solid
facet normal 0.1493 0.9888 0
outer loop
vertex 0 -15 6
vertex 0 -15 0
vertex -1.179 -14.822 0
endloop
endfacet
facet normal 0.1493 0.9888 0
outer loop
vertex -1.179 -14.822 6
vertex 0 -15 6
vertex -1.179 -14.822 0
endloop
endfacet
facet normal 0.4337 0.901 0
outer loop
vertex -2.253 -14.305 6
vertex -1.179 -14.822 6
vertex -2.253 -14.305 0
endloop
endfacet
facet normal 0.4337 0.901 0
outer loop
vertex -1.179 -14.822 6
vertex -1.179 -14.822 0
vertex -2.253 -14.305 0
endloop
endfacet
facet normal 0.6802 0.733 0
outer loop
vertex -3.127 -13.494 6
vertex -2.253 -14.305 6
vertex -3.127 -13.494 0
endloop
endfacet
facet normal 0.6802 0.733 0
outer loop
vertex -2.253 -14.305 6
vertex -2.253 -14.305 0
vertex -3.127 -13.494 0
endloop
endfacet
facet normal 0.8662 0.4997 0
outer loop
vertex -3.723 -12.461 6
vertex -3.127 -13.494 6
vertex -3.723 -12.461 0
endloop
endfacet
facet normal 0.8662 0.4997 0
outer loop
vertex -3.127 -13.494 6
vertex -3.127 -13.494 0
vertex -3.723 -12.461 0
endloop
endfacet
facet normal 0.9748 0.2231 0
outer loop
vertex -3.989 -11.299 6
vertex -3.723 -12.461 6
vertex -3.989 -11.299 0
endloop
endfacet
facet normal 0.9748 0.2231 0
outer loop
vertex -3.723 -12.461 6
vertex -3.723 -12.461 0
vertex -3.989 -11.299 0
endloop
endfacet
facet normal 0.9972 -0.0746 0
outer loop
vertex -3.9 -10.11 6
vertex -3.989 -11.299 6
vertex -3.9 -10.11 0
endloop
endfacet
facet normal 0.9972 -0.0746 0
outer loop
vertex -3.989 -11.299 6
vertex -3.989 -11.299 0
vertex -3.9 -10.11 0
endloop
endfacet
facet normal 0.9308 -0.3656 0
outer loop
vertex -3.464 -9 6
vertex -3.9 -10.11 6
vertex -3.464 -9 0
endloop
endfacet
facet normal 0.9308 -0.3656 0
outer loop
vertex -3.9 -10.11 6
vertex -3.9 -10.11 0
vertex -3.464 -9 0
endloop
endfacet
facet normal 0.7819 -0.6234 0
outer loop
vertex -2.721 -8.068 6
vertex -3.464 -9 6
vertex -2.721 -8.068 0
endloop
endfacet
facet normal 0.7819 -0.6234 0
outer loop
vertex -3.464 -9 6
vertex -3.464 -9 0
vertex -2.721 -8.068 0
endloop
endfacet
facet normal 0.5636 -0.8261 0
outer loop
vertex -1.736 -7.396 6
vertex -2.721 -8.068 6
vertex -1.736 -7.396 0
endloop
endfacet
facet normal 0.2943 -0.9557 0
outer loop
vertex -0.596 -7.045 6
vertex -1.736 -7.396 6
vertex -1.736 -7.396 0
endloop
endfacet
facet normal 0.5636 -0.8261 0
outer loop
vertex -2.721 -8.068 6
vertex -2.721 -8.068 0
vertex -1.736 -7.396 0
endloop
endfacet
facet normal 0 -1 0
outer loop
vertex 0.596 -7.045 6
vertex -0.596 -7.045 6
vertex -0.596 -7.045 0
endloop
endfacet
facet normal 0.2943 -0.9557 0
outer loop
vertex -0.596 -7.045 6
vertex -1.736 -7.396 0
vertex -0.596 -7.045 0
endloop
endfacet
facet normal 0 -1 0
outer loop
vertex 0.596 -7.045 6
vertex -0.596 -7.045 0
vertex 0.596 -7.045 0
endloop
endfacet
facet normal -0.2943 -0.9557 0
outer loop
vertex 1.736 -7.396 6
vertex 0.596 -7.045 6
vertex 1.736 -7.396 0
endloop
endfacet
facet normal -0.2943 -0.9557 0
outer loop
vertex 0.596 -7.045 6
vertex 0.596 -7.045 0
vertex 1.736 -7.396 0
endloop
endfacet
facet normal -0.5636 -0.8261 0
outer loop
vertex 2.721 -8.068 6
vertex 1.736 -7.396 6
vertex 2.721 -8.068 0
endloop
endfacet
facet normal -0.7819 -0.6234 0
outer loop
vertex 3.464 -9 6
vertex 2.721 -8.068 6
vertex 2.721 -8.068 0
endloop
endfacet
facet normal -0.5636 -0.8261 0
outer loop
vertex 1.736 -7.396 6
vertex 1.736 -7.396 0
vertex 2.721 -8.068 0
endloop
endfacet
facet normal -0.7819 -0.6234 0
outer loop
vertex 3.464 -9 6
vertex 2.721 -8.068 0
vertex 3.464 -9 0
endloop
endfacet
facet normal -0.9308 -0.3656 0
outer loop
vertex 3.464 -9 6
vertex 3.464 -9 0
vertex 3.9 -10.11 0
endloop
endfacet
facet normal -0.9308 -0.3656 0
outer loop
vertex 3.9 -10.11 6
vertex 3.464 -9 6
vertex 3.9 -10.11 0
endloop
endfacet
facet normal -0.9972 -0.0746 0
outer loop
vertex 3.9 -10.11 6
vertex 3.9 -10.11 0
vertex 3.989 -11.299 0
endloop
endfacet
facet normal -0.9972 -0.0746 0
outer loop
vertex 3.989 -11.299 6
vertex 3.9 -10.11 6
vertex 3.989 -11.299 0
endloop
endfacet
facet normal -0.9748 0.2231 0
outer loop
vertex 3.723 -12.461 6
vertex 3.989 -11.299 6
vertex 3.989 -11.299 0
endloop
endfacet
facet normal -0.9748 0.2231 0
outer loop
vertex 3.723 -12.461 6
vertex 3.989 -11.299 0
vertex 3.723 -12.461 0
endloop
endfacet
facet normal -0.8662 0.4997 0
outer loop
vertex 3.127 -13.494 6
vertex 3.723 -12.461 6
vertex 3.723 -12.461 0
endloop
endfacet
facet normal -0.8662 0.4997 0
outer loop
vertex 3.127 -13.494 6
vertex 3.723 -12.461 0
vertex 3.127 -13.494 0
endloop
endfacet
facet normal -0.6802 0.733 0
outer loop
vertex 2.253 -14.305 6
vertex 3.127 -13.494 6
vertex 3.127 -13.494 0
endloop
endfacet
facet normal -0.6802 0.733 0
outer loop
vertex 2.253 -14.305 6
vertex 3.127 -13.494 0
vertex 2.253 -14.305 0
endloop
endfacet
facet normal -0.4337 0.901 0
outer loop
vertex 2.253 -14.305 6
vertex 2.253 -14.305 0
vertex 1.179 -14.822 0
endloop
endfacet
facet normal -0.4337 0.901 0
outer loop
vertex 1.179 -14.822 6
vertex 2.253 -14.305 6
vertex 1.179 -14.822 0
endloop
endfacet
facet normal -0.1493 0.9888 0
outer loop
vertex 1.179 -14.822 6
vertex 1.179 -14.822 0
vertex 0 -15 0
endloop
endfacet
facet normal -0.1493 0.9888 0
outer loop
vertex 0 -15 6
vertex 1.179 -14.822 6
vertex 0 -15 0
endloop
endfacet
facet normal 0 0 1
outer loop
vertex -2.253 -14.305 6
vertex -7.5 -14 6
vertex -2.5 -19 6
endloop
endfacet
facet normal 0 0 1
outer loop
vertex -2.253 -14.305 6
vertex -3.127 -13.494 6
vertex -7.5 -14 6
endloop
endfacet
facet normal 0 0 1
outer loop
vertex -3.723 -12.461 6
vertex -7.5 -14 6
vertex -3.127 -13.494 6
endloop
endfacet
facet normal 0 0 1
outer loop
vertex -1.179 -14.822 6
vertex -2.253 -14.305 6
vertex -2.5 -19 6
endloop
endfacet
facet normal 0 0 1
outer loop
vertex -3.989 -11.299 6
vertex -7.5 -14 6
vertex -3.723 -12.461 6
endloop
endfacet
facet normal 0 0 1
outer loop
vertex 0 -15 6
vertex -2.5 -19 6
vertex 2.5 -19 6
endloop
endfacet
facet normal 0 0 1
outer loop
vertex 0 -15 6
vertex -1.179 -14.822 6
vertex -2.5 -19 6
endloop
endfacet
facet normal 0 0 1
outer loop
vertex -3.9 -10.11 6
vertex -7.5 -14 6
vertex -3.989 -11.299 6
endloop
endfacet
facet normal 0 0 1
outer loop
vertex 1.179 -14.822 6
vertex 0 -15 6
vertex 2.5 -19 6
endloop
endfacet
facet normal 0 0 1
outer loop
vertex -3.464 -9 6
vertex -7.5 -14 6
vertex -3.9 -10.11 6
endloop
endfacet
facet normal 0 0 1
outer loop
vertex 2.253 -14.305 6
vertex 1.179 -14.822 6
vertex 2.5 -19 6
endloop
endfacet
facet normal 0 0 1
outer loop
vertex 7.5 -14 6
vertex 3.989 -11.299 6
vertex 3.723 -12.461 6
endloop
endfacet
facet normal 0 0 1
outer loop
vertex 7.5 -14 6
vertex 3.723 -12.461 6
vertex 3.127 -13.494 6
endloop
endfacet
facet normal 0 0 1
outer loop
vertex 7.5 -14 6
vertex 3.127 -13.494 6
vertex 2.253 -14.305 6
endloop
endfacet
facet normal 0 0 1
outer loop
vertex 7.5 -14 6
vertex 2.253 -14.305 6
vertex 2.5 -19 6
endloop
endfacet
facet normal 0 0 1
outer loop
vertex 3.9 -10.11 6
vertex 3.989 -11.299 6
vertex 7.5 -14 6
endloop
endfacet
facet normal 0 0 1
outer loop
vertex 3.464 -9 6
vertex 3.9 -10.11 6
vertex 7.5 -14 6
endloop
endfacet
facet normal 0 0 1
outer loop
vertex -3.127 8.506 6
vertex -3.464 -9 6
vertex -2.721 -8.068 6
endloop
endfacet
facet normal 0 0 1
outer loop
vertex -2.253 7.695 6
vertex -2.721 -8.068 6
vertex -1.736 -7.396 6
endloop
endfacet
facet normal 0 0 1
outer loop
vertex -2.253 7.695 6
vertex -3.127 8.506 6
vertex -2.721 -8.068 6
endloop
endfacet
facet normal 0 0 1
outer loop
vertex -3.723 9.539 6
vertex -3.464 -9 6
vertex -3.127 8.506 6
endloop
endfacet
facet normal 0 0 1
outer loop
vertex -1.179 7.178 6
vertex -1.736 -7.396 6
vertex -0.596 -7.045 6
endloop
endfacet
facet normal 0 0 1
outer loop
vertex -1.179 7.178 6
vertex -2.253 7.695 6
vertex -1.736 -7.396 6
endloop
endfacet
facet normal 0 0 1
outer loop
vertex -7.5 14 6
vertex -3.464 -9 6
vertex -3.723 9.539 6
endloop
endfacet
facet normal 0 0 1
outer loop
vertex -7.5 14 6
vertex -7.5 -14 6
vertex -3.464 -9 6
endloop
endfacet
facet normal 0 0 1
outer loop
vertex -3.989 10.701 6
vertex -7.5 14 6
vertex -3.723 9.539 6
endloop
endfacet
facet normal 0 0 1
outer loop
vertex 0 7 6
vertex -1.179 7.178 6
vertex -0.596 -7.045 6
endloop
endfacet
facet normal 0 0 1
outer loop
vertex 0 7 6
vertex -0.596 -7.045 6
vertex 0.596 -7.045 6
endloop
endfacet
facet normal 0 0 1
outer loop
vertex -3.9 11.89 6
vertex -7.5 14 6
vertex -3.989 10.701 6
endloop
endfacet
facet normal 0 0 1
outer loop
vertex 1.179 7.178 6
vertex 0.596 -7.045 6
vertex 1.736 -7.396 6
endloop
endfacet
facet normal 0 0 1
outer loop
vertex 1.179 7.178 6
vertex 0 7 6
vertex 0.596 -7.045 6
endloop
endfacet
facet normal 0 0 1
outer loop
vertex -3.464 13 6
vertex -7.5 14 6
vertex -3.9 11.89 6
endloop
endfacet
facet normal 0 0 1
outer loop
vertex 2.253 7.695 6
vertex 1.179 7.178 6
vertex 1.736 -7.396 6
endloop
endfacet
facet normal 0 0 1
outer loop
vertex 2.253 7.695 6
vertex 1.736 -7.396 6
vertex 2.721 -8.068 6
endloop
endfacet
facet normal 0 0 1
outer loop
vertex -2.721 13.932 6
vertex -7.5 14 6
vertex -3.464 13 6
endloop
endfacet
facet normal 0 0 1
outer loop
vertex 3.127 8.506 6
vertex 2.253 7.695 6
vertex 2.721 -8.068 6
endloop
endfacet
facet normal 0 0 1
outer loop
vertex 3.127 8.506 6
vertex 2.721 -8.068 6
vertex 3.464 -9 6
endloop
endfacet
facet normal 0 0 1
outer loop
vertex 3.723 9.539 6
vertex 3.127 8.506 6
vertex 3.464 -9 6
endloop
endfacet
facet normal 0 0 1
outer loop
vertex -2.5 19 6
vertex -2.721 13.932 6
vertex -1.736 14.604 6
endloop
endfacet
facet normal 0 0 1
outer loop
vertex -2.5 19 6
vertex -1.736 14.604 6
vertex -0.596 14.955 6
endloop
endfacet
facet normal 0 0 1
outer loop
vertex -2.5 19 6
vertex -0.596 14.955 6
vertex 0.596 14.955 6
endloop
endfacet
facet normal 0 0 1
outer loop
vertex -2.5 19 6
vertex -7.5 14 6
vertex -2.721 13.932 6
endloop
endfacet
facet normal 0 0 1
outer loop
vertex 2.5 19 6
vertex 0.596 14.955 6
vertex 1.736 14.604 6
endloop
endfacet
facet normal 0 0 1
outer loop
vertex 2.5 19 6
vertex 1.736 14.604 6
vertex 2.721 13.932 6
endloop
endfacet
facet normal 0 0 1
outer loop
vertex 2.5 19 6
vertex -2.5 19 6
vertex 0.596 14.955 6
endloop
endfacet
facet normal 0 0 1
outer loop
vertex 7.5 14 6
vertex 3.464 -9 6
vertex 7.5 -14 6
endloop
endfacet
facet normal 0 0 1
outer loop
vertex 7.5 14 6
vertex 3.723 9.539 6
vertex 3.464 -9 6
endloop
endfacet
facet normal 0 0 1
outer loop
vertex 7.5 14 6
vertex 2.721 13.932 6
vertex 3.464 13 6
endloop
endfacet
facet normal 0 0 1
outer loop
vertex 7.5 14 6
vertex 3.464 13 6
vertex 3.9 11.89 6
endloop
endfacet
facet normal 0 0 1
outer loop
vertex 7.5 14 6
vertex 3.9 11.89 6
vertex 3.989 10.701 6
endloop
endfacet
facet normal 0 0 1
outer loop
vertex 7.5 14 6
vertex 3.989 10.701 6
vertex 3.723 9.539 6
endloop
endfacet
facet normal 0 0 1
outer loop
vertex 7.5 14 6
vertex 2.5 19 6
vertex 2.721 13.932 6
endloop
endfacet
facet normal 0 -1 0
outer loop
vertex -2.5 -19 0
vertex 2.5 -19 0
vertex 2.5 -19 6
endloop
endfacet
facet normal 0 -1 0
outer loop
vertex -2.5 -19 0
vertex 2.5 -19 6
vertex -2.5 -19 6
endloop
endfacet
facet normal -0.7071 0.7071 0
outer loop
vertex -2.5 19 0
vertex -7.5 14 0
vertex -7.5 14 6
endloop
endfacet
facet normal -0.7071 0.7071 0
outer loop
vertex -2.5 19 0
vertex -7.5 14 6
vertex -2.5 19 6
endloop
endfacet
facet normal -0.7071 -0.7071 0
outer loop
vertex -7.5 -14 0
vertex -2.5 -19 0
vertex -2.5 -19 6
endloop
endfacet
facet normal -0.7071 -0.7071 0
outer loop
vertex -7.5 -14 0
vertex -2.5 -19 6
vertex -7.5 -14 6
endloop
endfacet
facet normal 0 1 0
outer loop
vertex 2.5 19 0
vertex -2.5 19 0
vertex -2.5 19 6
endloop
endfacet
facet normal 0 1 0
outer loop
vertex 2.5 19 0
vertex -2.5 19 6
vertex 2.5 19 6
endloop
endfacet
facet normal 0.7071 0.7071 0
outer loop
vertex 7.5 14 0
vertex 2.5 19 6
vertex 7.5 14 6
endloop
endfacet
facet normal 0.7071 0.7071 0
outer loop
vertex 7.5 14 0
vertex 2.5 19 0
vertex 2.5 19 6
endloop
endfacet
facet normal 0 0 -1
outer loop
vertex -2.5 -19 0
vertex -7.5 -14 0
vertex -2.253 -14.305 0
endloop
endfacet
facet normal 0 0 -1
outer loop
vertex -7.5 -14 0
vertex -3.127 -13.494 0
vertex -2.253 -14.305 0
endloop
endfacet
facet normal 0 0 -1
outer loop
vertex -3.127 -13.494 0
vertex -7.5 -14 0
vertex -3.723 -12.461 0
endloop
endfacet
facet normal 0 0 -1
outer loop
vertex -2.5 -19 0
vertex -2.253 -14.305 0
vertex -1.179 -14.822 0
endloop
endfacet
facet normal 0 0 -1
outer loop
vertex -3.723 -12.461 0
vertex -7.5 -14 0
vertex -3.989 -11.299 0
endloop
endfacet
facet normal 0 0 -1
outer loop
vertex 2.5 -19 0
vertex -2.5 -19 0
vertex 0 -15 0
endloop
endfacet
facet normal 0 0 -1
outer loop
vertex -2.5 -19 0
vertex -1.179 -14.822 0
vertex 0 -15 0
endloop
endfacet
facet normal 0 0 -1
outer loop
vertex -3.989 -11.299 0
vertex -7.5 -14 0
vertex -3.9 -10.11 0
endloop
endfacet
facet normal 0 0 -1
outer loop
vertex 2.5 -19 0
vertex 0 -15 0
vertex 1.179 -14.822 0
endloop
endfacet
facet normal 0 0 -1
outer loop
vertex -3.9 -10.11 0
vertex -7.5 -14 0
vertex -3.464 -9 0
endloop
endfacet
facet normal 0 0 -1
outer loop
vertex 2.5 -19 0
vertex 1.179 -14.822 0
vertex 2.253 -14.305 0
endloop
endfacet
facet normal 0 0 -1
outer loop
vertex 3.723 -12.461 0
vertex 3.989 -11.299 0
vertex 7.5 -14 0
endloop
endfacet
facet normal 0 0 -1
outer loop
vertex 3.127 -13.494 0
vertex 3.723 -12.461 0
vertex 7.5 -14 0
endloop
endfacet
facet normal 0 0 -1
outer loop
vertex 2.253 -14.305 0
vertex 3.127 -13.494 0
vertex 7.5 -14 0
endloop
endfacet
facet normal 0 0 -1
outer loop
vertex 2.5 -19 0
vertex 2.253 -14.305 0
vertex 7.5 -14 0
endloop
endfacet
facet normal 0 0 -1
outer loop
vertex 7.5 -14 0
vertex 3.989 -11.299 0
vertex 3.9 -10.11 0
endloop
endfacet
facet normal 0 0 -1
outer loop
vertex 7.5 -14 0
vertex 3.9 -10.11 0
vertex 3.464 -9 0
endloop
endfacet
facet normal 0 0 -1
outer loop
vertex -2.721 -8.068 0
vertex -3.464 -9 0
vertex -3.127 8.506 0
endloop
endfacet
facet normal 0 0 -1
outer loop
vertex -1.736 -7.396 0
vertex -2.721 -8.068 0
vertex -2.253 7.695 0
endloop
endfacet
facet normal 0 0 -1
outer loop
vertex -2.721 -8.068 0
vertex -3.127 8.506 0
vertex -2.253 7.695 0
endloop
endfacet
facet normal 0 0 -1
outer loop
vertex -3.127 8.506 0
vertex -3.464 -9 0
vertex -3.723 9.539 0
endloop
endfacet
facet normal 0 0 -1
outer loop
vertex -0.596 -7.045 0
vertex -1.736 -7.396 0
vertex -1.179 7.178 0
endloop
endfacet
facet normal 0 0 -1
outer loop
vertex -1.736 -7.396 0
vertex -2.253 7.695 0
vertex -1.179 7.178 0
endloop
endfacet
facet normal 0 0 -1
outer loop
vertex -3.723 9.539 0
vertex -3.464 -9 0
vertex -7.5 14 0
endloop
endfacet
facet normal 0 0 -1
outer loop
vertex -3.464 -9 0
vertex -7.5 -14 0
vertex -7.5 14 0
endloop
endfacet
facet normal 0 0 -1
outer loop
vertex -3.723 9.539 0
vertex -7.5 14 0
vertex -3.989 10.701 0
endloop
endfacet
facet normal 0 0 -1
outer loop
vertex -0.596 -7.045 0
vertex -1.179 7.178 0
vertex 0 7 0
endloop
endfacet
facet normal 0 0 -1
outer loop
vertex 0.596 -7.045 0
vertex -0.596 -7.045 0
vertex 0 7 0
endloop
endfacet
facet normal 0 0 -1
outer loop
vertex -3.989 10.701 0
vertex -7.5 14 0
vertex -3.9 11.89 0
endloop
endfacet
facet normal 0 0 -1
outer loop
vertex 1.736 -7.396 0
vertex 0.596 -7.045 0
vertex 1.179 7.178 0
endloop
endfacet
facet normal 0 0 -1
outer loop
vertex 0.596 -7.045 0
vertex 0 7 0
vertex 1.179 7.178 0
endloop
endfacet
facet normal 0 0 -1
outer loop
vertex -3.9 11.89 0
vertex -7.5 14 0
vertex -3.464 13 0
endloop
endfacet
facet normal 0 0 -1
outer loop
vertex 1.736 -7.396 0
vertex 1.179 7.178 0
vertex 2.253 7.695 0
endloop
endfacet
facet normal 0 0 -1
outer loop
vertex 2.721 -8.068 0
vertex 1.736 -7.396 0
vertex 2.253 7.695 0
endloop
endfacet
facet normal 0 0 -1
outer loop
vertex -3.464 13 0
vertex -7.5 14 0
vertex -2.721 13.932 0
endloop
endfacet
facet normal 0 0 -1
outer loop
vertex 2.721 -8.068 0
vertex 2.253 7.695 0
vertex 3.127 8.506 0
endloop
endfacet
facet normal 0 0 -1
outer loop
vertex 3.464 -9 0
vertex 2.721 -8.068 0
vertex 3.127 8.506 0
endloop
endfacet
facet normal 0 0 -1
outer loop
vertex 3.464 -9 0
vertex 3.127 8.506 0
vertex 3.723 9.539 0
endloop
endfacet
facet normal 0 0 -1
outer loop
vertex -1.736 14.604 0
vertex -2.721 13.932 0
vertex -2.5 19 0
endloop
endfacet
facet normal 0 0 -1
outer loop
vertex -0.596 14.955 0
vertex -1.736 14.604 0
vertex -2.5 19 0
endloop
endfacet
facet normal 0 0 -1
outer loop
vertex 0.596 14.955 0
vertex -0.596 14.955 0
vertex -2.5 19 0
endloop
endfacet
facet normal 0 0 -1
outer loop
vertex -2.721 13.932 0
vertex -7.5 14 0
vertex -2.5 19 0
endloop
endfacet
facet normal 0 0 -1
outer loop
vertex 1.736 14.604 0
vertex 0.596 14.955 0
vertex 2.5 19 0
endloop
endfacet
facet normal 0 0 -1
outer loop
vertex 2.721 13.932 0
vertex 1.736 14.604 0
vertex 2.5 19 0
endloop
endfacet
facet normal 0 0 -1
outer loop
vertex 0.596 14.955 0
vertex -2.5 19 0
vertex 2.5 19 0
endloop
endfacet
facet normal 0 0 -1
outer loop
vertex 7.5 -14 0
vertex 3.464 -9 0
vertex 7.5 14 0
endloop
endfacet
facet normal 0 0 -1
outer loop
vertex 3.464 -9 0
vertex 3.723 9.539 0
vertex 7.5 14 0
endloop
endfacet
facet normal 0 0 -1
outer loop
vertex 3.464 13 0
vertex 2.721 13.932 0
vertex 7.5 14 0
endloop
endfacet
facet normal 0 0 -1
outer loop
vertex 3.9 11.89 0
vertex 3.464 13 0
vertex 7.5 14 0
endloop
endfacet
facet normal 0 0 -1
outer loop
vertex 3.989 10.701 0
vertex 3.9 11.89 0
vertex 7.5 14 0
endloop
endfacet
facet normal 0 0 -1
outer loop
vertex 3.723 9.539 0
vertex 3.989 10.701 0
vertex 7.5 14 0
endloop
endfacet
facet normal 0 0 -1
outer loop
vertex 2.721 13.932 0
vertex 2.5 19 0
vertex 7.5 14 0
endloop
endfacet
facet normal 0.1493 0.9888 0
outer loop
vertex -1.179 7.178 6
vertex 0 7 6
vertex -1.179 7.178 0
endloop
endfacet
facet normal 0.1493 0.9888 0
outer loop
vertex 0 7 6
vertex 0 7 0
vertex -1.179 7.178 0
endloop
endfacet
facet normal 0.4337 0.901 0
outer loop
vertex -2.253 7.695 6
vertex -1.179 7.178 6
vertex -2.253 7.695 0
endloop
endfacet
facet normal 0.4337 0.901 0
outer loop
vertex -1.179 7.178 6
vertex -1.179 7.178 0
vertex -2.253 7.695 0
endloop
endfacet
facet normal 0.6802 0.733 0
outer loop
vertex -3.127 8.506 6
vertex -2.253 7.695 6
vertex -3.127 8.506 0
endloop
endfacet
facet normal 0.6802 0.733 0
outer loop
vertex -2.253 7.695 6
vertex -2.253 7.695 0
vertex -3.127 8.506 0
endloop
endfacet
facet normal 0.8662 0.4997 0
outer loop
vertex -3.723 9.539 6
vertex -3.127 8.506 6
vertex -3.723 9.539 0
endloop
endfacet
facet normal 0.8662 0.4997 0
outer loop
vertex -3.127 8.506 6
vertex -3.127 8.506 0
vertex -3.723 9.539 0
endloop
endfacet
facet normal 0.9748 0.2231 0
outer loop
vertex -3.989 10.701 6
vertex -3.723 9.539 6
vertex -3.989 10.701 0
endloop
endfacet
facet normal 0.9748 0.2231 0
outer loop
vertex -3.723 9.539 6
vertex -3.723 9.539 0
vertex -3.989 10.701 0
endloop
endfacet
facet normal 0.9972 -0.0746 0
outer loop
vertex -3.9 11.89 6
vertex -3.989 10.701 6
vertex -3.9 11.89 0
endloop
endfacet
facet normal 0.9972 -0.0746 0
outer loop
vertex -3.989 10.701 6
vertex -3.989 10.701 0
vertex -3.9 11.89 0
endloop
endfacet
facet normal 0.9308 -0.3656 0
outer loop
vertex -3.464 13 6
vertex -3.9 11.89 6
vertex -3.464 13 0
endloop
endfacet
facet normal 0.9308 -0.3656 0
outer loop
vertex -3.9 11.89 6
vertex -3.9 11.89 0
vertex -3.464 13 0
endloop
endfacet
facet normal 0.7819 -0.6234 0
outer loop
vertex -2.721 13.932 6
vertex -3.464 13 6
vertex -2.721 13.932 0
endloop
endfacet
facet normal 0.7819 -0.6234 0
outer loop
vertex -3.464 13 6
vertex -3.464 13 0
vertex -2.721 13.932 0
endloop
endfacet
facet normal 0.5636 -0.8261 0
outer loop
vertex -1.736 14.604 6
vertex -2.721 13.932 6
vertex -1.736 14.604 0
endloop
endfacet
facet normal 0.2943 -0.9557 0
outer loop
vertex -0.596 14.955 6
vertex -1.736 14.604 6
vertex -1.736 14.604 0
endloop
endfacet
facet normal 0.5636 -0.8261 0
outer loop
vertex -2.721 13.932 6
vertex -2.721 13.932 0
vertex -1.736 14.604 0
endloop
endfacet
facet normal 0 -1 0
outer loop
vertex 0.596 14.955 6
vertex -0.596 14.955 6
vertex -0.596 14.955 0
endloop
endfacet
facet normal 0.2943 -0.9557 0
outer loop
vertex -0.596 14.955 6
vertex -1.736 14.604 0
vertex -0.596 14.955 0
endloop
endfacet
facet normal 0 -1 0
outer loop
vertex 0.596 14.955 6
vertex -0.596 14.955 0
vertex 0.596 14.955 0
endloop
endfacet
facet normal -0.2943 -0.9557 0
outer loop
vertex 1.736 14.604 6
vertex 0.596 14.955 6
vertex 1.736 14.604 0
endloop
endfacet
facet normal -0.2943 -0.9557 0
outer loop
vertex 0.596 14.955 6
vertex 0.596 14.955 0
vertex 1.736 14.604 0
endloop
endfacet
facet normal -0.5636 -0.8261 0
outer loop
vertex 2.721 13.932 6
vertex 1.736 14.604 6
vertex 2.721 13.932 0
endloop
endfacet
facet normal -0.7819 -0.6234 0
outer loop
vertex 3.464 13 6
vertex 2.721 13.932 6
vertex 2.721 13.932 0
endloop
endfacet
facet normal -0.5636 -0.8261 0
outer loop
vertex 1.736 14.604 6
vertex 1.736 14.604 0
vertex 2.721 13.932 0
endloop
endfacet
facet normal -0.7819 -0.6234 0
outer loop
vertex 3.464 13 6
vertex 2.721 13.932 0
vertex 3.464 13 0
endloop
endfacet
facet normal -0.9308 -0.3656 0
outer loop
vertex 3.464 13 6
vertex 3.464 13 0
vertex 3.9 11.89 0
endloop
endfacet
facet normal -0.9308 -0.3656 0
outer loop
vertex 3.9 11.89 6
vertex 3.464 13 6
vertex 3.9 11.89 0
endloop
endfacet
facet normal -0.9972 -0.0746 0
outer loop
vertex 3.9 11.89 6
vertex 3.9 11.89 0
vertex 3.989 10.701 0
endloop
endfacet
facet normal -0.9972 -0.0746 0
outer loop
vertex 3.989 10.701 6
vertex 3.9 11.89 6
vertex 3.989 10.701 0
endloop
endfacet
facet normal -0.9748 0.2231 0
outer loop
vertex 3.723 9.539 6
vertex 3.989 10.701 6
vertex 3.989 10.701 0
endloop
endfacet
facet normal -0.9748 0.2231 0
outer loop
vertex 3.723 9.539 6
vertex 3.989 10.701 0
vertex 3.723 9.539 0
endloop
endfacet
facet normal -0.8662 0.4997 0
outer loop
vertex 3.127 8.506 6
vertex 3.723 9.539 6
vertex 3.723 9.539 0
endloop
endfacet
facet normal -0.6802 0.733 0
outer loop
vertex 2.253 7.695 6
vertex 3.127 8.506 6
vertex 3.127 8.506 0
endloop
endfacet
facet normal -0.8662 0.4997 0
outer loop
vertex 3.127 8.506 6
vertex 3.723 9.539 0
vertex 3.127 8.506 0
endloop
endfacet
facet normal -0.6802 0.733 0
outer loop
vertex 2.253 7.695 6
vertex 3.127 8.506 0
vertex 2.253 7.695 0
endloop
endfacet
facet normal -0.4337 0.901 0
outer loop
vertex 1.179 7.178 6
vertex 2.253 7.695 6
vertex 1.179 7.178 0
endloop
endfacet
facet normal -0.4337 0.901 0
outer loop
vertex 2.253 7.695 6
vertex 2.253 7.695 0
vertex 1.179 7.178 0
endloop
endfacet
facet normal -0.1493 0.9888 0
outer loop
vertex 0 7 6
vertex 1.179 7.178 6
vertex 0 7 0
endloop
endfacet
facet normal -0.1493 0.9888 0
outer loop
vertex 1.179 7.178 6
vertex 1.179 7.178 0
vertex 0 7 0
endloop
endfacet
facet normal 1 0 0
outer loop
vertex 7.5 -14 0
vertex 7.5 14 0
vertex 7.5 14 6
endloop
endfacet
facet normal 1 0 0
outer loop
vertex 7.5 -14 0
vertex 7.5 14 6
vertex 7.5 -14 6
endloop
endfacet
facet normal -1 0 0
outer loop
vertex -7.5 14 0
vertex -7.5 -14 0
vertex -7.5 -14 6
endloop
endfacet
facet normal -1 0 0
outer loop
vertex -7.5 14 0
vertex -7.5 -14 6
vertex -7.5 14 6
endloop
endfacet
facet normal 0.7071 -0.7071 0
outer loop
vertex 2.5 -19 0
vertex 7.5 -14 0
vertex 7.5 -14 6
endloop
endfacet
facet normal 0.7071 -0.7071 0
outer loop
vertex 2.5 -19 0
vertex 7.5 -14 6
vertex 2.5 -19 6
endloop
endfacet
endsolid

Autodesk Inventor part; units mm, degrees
ref_plane "YZ Plane" through (0, 0, 0) normal (1, 0, 0) x (0, 1, 0)
ref_plane "XZ Plane" through (0, 0, 0) normal (0, 1, 0) x (-1, 0, 0)
ref_plane "XY Plane" through (0, 0, 0) normal (0, 0, 1) x (1, 0, 0)
sketch "Sketch1" plane through (0, 0, 0) normal (0, 0, 1) x (1, 0, 0)
  line L0 (-9, 0) -> (12, 0) projected
  line L1 (0, 30.4) -> (0, -22.8) projected
  line L2 (-2.5, 19) -> (2.5, 19)
  line L3 (2.5, 19) -> (7.5, 14)
  line L4 (7.5, 14) -> (7.5, -14)
  line L5 (7.5, -14) -> (2.5, -19)
  line L6 (2.5, -19) -> (-2.5, -19)
  line L7 (-2.5, -19) -> (-7.5, -14)
  line L8 (-7.5, -14) -> (-7.5, 14)
  line L9 (-7.5, 14) -> (-2.5, 19)
  dimension "d0" = 5
  dimension "d1" = 38
  dimension "d2" = 5
  dimension "d3" = 45
  dimension "d5" = 45
  dimension "d6" = 45
  dimension "d7" = 5
  dimension "d8" = 15
  dimension "d10" = 5
extrude "Extrusion1" add sketch "Sketch1" along normal blind 6
sketch "Sketch2" plane through (0, 0, 6) normal (0, 0, 1) x (1, 0, 0)
  line L0 (-2.5, 19) -> (2.5, 19) projected
  line L1 (2.5, -19) -> (-2.5, -19) projected
  line L2 (0, 30.4) -> (0, -22.8) projected
  point P0 (0, 11)
  point P1 (0, -11)
  dimension "d13" = 8
  dimension "d14" = 8
hole "Hole1" at (0, 11, 6) at (0, -11, 6) direction (0, 0, -1) diameter 8 end through all
properties part number "Link"
